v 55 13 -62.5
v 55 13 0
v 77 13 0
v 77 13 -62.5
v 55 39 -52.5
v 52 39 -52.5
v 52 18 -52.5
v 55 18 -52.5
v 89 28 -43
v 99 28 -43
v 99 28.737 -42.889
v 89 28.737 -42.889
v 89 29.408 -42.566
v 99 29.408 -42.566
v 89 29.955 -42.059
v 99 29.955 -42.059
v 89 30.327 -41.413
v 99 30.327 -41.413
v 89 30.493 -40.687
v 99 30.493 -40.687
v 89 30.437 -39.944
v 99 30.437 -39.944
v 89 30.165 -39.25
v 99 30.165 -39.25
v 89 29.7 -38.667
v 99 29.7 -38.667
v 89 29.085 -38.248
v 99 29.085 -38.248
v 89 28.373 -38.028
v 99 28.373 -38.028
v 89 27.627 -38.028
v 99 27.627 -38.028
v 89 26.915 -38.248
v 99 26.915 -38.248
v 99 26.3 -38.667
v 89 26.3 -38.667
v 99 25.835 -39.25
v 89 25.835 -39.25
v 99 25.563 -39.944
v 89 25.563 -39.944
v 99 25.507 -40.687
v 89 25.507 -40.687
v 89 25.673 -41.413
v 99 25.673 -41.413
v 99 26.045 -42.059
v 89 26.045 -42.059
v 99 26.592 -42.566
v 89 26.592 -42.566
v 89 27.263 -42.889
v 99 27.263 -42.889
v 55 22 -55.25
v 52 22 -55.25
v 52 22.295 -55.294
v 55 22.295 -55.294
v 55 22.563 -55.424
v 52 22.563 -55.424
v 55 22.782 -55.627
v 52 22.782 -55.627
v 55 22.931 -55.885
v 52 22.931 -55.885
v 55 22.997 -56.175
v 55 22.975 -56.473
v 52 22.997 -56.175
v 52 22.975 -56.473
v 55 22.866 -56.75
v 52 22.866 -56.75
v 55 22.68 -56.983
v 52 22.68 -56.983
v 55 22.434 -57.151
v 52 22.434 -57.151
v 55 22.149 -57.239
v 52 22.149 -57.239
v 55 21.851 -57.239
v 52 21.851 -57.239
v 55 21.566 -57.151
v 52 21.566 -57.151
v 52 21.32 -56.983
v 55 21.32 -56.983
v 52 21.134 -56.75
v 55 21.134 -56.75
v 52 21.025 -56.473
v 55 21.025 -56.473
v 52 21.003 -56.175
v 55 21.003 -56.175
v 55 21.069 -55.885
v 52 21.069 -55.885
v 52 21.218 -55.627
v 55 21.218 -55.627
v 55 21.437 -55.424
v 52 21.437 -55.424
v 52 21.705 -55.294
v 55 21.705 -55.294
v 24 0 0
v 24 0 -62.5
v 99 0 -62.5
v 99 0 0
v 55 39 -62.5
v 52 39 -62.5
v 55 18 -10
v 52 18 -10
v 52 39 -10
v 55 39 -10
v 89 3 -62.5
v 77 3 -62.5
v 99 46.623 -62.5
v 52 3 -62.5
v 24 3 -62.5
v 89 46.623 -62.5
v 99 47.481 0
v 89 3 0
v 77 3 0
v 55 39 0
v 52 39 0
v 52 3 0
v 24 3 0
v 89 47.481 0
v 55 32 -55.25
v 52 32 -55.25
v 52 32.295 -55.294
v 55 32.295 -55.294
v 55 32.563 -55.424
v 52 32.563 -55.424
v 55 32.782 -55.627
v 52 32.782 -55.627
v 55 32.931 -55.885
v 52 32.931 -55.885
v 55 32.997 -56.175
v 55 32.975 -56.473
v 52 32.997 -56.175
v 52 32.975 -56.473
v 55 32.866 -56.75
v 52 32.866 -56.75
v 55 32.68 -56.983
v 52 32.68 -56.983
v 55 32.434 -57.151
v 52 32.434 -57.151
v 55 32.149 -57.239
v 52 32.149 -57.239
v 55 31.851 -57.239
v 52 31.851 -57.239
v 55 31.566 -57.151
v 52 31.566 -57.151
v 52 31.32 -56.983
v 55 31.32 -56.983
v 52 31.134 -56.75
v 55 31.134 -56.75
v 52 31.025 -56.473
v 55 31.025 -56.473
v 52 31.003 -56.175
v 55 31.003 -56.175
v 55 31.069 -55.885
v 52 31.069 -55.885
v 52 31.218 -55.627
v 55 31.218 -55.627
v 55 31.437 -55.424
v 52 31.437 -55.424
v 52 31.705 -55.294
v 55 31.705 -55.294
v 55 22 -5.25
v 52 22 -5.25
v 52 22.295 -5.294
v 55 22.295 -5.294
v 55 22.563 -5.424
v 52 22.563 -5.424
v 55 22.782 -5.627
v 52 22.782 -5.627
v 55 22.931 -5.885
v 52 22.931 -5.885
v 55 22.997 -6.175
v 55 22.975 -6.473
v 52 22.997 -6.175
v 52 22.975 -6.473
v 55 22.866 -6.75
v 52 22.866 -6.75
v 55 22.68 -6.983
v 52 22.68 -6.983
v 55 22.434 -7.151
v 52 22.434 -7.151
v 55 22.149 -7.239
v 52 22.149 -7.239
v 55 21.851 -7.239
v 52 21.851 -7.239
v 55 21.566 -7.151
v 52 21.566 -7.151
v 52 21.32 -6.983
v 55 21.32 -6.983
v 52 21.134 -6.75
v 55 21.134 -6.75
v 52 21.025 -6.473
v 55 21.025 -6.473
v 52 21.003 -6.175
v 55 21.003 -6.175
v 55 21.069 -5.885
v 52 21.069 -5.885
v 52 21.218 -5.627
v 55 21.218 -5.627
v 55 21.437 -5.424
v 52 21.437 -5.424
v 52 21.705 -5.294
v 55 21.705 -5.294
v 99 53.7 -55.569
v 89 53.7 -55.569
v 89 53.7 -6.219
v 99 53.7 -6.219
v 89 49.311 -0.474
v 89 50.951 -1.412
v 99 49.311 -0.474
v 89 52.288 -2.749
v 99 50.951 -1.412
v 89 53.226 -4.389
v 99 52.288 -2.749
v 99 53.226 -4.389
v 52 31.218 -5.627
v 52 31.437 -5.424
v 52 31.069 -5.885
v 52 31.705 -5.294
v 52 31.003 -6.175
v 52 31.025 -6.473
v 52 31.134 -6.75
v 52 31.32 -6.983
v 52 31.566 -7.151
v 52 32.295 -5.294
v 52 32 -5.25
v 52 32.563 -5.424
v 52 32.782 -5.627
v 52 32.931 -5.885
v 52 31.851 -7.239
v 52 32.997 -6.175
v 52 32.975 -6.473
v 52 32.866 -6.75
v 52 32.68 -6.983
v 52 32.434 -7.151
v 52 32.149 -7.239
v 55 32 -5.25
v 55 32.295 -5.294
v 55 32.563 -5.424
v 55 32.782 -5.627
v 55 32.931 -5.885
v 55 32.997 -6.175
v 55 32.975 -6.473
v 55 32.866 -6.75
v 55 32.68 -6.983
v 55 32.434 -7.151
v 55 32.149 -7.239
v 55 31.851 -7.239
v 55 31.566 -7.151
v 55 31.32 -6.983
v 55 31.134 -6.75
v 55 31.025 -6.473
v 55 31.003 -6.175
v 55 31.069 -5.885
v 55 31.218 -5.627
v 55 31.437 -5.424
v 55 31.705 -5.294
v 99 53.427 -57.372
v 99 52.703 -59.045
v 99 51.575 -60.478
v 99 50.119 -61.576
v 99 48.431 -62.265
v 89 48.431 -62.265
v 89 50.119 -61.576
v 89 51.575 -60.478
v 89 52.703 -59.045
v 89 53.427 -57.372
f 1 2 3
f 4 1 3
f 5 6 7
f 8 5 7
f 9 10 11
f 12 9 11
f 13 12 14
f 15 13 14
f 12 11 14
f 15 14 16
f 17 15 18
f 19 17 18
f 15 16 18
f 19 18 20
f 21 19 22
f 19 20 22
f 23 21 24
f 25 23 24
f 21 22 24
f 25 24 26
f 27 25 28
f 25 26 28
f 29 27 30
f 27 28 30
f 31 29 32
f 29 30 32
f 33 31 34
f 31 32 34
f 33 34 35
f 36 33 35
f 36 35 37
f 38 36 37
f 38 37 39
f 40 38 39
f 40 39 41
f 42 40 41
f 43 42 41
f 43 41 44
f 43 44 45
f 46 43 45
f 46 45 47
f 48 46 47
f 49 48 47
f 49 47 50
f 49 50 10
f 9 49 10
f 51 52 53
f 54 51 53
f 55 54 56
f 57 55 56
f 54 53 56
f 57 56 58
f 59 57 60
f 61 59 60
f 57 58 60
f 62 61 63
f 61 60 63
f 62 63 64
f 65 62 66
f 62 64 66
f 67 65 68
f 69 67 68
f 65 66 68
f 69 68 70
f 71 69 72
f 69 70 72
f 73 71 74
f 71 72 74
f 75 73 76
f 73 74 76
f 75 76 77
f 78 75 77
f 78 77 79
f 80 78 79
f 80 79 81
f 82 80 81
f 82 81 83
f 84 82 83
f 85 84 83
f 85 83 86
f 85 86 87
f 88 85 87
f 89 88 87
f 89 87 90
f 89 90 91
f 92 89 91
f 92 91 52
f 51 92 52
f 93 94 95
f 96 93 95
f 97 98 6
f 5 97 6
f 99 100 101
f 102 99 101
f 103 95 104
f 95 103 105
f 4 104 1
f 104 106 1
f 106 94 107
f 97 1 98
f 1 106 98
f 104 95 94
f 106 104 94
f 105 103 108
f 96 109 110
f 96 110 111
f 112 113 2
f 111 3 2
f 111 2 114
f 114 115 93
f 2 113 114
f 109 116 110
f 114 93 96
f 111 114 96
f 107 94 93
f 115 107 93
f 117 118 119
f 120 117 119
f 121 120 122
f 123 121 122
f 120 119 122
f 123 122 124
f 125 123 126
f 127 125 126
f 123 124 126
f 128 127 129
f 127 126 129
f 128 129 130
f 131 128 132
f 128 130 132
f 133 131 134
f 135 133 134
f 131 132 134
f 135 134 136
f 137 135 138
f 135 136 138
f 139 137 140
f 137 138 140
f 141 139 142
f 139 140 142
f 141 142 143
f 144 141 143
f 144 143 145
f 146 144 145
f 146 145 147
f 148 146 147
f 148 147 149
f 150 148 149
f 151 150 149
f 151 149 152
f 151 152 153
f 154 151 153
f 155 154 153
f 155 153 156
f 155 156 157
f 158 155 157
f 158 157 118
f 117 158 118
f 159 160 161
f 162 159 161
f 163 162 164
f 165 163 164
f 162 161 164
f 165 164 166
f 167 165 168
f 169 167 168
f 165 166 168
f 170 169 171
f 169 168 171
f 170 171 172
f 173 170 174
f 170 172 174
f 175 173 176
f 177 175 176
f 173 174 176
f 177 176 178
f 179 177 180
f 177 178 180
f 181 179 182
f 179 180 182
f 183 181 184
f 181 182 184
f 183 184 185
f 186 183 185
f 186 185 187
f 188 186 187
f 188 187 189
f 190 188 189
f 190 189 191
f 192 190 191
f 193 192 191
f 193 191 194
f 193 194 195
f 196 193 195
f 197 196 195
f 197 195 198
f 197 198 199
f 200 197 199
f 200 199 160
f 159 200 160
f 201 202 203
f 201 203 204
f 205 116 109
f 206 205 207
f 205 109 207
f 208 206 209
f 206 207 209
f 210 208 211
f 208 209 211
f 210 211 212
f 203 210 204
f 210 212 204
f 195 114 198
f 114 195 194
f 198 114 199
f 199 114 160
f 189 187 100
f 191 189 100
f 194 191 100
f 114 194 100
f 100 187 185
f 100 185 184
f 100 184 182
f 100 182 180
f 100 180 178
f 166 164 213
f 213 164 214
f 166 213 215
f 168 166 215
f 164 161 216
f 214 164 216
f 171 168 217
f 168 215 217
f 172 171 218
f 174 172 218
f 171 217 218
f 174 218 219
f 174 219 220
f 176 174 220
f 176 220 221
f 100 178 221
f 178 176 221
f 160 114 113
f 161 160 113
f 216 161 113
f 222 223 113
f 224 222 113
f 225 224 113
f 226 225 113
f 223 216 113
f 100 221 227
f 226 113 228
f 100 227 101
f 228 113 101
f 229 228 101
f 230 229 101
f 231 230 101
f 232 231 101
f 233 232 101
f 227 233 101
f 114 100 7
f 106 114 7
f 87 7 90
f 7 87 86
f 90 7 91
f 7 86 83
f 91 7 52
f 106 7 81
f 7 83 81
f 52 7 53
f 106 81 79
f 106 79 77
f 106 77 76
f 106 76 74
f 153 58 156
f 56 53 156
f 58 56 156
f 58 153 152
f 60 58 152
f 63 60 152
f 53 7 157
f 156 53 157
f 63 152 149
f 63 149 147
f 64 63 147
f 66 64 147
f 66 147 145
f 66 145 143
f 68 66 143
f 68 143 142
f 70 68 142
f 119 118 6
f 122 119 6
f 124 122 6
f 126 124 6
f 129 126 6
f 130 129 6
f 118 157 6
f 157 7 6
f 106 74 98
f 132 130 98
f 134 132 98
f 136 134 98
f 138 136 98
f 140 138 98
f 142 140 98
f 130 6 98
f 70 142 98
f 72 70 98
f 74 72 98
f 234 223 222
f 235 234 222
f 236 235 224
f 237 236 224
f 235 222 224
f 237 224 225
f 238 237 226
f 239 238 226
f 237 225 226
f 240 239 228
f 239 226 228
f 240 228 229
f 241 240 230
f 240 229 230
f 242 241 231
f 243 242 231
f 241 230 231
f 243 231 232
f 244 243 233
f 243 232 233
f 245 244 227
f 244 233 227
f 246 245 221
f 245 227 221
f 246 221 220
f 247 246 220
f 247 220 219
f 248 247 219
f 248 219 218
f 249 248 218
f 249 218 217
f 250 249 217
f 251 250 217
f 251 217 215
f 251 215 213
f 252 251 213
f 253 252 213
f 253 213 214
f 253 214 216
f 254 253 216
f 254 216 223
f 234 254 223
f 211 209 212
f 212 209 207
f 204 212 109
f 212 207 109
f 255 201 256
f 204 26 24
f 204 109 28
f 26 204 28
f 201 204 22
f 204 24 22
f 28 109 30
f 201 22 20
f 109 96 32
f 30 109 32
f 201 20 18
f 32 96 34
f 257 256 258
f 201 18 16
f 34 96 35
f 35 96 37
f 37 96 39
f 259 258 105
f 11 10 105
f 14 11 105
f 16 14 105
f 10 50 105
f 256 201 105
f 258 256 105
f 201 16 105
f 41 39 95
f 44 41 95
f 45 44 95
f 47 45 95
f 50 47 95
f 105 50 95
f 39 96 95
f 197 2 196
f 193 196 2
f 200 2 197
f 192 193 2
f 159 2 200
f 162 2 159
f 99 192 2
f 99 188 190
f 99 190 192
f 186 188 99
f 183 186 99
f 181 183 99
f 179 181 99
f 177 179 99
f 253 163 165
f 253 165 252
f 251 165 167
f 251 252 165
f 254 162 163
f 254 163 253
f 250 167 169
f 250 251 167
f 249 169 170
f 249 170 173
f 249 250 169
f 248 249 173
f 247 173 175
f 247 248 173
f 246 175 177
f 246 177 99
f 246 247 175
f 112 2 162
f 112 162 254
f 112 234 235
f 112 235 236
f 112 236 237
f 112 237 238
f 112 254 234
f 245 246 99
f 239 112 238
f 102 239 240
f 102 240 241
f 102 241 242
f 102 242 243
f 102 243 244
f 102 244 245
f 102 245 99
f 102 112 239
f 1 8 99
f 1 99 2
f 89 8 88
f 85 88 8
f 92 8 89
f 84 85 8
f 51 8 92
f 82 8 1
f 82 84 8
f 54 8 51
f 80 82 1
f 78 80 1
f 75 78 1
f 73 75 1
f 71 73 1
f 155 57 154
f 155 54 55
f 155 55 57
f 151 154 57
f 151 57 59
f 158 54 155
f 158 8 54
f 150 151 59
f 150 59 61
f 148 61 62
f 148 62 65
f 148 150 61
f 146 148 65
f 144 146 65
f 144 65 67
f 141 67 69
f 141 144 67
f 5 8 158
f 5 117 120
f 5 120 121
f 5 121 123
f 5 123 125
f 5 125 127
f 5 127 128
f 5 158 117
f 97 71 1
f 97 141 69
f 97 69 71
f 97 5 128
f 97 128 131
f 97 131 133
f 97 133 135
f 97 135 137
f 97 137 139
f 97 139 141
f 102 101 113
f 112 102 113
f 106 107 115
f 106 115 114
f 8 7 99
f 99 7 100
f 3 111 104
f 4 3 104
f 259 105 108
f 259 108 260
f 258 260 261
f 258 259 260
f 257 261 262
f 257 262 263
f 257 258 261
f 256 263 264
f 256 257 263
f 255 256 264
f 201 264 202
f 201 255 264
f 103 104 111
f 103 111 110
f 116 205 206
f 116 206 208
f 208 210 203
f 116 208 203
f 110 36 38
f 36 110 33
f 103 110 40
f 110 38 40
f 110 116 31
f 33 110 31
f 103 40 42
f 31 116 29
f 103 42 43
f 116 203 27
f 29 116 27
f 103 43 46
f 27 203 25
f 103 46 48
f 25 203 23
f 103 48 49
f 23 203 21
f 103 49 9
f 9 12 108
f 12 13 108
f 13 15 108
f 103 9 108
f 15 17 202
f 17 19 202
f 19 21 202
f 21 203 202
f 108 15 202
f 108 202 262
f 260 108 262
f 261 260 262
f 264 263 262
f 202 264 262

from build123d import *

# Parameters (mm, degrees)
SKETCH1_W           = 99
SKETCH1_H           = 62.5
BOSS_EXTRUDE1_DEPTH = 53.7
SKETCH2_W           = 79
SKETCH2_H           = 62.5
CUT_EXTRUDE1_DEPTH  = 50.7
SKETCH3_W           = 25
SKETCH3_H           = 62.5
BOSS_EXTRUDE2_DEPTH = 10
BOSS_EXTRUDE4_DEPTH = 3
SKETCH5_W           = 24
SKETCH5_H           = 62.5
CUT_EXTRUDE3_DEPTH  = 72
CUT_EXTRUDE4_REACH  = 96.863
SKETCH6_R           = 1
SKETCH7_R           = 2.5
CUT_EXTRUDE5_DEPTH  = 72
CUT_EXTRUDE7_DEPTH  = 50


with BuildPart() as part:
    # Sketch1 → Boss-Extrude1 (new body)
    with BuildSketch(Plane(origin=(0, 0, 0), x_dir=(1, 0, 0), z_dir=(0, 1, 0))):
        with Locations((49.5, 31.25)):
            Rectangle(SKETCH1_W, SKETCH1_H)
    extrude(amount=BOSS_EXTRUDE1_DEPTH)

    # Sketch2 → Cut-Extrude1 (cut)
    with BuildSketch(Plane(origin=(0, 53.7, 0), x_dir=(1, 0, 0), z_dir=(0, 1, 0))):
        with Locations((49.5, 31.25)):
            Rectangle(SKETCH2_W, SKETCH2_H)
    extrude(amount=-CUT_EXTRUDE1_DEPTH, mode=Mode.SUBTRACT)

    # Sketch3 → Boss-Extrude2 (add)
    with BuildSketch(Plane(origin=(0, 3, 0), x_dir=(1, 0, 0), z_dir=(0, 1, 0))):
        with Locations((64.5, 31.25)):
            Rectangle(SKETCH3_W, SKETCH3_H)
    extrude(amount=BOSS_EXTRUDE2_DEPTH)

    # Sketch4 → Boss-Extrude4 (add)
    with BuildSketch(Plane.ZY.offset(-52)):
        Polygon((-62.5, 13), (-62.5, 39), (-52.5, 39), (-52.5, 18), (-10, 18), (-10, 39), (0, 39), (0, 13), align=None)
    extrude(amount=-BOSS_EXTRUDE4_DEPTH)

    # Sketch5 → Cut-Extrude3 (cut)
    with BuildSketch(Plane.XZ):
        with Locations((12, -31.25)):
            Rectangle(SKETCH5_W, SKETCH5_H)
    extrude(amount=-CUT_EXTRUDE3_DEPTH, mode=Mode.SUBTRACT)

    # Sketch6 → Cut-Extrude4 (cut, up to next)
    with BuildSketch(Plane.ZY.offset(-52), mode=Mode.PRIVATE) as cut_extrude4_sk1:
        with Locations((-56.25, 32)):
            Circle(SKETCH6_R)
    cut_extrude4_tool1 = extrude(cut_extrude4_sk1.sketch, amount=-CUT_EXTRUDE4_REACH, mode=Mode.PRIVATE) & part.part
    # Sketch6 → Cut-Extrude4 (cut, up to next)
    with BuildSketch(Plane.ZY.offset(-52), mode=Mode.PRIVATE) as cut_extrude4_sk2:
        with Locations((-56.25, 22)):
            Circle(SKETCH6_R)
    cut_extrude4_tool2 = extrude(cut_extrude4_sk2.sketch, amount=-CUT_EXTRUDE4_REACH, mode=Mode.PRIVATE) & part.part
    # Sketch6 → Cut-Extrude4 (cut, up to next)
    with BuildSketch(Plane.ZY.offset(-52), mode=Mode.PRIVATE) as cut_extrude4_sk3:
        with Locations((-6.25, 22)):
            Circle(SKETCH6_R)
    cut_extrude4_tool3 = extrude(cut_extrude4_sk3.sketch, amount=-CUT_EXTRUDE4_REACH, mode=Mode.PRIVATE) & part.part
    # Sketch6 → Cut-Extrude4 (cut, up to next)
    with BuildSketch(Plane.ZY.offset(-52), mode=Mode.PRIVATE) as cut_extrude4_sk4:
        with Locations((-6.25, 32)):
            Circle(SKETCH6_R)
    cut_extrude4_tool4 = extrude(cut_extrude4_sk4.sketch, amount=-CUT_EXTRUDE4_REACH, mode=Mode.PRIVATE) & part.part
    add(cut_extrude4_tool1.solids().sort_by_distance((52, 32, -56.25))[0], mode=Mode.SUBTRACT)
    add(cut_extrude4_tool2.solids().sort_by_distance((52, 22, -56.25))[0], mode=Mode.SUBTRACT)
    add(cut_extrude4_tool3.solids().sort_by_distance((52, 22, -6.25))[0], mode=Mode.SUBTRACT)
    add(cut_extrude4_tool4.solids().sort_by_distance((52, 32, -6.25))[0], mode=Mode.SUBTRACT)

    # Sketch7 → Cut-Extrude5 (cut)
    with BuildSketch(Plane(origin=(99, 0, 0), x_dir=(0, 0, -1), z_dir=(1, 0, 0))):
        with Locations((40.5, 28)):
            Circle(SKETCH7_R)
    extrude(amount=-CUT_EXTRUDE5_DEPTH, mode=Mode.SUBTRACT)

    # Sketch10 → Cut-Extrude7 (cut)
    with BuildSketch(Plane(origin=(99, 0, 0), x_dir=(0, 0, -1), z_dir=(1, 0, 0))):
        with BuildLine():
            Line((0, 53.7), (0, 47.481187229))
            ThreePointArc((0, 47.481187229), (2.036166959, 51.663833041), (6.218812771, 53.7))
            Line((6.218812771, 53.7), (0, 53.7))
        make_face()
        with BuildLine():
            ThreePointArc((62.5, 46.622902441), (60.478284246, 51.575372551), (55.569083395, 53.7))
            Line((55.569083395, 53.7), (62.5, 53.7))
            Line((62.5, 53.7), (62.5, 46.622902441))
        make_face()
    extrude(amount=-CUT_EXTRUDE7_DEPTH, mode=Mode.SUBTRACT)


solid = part.part
